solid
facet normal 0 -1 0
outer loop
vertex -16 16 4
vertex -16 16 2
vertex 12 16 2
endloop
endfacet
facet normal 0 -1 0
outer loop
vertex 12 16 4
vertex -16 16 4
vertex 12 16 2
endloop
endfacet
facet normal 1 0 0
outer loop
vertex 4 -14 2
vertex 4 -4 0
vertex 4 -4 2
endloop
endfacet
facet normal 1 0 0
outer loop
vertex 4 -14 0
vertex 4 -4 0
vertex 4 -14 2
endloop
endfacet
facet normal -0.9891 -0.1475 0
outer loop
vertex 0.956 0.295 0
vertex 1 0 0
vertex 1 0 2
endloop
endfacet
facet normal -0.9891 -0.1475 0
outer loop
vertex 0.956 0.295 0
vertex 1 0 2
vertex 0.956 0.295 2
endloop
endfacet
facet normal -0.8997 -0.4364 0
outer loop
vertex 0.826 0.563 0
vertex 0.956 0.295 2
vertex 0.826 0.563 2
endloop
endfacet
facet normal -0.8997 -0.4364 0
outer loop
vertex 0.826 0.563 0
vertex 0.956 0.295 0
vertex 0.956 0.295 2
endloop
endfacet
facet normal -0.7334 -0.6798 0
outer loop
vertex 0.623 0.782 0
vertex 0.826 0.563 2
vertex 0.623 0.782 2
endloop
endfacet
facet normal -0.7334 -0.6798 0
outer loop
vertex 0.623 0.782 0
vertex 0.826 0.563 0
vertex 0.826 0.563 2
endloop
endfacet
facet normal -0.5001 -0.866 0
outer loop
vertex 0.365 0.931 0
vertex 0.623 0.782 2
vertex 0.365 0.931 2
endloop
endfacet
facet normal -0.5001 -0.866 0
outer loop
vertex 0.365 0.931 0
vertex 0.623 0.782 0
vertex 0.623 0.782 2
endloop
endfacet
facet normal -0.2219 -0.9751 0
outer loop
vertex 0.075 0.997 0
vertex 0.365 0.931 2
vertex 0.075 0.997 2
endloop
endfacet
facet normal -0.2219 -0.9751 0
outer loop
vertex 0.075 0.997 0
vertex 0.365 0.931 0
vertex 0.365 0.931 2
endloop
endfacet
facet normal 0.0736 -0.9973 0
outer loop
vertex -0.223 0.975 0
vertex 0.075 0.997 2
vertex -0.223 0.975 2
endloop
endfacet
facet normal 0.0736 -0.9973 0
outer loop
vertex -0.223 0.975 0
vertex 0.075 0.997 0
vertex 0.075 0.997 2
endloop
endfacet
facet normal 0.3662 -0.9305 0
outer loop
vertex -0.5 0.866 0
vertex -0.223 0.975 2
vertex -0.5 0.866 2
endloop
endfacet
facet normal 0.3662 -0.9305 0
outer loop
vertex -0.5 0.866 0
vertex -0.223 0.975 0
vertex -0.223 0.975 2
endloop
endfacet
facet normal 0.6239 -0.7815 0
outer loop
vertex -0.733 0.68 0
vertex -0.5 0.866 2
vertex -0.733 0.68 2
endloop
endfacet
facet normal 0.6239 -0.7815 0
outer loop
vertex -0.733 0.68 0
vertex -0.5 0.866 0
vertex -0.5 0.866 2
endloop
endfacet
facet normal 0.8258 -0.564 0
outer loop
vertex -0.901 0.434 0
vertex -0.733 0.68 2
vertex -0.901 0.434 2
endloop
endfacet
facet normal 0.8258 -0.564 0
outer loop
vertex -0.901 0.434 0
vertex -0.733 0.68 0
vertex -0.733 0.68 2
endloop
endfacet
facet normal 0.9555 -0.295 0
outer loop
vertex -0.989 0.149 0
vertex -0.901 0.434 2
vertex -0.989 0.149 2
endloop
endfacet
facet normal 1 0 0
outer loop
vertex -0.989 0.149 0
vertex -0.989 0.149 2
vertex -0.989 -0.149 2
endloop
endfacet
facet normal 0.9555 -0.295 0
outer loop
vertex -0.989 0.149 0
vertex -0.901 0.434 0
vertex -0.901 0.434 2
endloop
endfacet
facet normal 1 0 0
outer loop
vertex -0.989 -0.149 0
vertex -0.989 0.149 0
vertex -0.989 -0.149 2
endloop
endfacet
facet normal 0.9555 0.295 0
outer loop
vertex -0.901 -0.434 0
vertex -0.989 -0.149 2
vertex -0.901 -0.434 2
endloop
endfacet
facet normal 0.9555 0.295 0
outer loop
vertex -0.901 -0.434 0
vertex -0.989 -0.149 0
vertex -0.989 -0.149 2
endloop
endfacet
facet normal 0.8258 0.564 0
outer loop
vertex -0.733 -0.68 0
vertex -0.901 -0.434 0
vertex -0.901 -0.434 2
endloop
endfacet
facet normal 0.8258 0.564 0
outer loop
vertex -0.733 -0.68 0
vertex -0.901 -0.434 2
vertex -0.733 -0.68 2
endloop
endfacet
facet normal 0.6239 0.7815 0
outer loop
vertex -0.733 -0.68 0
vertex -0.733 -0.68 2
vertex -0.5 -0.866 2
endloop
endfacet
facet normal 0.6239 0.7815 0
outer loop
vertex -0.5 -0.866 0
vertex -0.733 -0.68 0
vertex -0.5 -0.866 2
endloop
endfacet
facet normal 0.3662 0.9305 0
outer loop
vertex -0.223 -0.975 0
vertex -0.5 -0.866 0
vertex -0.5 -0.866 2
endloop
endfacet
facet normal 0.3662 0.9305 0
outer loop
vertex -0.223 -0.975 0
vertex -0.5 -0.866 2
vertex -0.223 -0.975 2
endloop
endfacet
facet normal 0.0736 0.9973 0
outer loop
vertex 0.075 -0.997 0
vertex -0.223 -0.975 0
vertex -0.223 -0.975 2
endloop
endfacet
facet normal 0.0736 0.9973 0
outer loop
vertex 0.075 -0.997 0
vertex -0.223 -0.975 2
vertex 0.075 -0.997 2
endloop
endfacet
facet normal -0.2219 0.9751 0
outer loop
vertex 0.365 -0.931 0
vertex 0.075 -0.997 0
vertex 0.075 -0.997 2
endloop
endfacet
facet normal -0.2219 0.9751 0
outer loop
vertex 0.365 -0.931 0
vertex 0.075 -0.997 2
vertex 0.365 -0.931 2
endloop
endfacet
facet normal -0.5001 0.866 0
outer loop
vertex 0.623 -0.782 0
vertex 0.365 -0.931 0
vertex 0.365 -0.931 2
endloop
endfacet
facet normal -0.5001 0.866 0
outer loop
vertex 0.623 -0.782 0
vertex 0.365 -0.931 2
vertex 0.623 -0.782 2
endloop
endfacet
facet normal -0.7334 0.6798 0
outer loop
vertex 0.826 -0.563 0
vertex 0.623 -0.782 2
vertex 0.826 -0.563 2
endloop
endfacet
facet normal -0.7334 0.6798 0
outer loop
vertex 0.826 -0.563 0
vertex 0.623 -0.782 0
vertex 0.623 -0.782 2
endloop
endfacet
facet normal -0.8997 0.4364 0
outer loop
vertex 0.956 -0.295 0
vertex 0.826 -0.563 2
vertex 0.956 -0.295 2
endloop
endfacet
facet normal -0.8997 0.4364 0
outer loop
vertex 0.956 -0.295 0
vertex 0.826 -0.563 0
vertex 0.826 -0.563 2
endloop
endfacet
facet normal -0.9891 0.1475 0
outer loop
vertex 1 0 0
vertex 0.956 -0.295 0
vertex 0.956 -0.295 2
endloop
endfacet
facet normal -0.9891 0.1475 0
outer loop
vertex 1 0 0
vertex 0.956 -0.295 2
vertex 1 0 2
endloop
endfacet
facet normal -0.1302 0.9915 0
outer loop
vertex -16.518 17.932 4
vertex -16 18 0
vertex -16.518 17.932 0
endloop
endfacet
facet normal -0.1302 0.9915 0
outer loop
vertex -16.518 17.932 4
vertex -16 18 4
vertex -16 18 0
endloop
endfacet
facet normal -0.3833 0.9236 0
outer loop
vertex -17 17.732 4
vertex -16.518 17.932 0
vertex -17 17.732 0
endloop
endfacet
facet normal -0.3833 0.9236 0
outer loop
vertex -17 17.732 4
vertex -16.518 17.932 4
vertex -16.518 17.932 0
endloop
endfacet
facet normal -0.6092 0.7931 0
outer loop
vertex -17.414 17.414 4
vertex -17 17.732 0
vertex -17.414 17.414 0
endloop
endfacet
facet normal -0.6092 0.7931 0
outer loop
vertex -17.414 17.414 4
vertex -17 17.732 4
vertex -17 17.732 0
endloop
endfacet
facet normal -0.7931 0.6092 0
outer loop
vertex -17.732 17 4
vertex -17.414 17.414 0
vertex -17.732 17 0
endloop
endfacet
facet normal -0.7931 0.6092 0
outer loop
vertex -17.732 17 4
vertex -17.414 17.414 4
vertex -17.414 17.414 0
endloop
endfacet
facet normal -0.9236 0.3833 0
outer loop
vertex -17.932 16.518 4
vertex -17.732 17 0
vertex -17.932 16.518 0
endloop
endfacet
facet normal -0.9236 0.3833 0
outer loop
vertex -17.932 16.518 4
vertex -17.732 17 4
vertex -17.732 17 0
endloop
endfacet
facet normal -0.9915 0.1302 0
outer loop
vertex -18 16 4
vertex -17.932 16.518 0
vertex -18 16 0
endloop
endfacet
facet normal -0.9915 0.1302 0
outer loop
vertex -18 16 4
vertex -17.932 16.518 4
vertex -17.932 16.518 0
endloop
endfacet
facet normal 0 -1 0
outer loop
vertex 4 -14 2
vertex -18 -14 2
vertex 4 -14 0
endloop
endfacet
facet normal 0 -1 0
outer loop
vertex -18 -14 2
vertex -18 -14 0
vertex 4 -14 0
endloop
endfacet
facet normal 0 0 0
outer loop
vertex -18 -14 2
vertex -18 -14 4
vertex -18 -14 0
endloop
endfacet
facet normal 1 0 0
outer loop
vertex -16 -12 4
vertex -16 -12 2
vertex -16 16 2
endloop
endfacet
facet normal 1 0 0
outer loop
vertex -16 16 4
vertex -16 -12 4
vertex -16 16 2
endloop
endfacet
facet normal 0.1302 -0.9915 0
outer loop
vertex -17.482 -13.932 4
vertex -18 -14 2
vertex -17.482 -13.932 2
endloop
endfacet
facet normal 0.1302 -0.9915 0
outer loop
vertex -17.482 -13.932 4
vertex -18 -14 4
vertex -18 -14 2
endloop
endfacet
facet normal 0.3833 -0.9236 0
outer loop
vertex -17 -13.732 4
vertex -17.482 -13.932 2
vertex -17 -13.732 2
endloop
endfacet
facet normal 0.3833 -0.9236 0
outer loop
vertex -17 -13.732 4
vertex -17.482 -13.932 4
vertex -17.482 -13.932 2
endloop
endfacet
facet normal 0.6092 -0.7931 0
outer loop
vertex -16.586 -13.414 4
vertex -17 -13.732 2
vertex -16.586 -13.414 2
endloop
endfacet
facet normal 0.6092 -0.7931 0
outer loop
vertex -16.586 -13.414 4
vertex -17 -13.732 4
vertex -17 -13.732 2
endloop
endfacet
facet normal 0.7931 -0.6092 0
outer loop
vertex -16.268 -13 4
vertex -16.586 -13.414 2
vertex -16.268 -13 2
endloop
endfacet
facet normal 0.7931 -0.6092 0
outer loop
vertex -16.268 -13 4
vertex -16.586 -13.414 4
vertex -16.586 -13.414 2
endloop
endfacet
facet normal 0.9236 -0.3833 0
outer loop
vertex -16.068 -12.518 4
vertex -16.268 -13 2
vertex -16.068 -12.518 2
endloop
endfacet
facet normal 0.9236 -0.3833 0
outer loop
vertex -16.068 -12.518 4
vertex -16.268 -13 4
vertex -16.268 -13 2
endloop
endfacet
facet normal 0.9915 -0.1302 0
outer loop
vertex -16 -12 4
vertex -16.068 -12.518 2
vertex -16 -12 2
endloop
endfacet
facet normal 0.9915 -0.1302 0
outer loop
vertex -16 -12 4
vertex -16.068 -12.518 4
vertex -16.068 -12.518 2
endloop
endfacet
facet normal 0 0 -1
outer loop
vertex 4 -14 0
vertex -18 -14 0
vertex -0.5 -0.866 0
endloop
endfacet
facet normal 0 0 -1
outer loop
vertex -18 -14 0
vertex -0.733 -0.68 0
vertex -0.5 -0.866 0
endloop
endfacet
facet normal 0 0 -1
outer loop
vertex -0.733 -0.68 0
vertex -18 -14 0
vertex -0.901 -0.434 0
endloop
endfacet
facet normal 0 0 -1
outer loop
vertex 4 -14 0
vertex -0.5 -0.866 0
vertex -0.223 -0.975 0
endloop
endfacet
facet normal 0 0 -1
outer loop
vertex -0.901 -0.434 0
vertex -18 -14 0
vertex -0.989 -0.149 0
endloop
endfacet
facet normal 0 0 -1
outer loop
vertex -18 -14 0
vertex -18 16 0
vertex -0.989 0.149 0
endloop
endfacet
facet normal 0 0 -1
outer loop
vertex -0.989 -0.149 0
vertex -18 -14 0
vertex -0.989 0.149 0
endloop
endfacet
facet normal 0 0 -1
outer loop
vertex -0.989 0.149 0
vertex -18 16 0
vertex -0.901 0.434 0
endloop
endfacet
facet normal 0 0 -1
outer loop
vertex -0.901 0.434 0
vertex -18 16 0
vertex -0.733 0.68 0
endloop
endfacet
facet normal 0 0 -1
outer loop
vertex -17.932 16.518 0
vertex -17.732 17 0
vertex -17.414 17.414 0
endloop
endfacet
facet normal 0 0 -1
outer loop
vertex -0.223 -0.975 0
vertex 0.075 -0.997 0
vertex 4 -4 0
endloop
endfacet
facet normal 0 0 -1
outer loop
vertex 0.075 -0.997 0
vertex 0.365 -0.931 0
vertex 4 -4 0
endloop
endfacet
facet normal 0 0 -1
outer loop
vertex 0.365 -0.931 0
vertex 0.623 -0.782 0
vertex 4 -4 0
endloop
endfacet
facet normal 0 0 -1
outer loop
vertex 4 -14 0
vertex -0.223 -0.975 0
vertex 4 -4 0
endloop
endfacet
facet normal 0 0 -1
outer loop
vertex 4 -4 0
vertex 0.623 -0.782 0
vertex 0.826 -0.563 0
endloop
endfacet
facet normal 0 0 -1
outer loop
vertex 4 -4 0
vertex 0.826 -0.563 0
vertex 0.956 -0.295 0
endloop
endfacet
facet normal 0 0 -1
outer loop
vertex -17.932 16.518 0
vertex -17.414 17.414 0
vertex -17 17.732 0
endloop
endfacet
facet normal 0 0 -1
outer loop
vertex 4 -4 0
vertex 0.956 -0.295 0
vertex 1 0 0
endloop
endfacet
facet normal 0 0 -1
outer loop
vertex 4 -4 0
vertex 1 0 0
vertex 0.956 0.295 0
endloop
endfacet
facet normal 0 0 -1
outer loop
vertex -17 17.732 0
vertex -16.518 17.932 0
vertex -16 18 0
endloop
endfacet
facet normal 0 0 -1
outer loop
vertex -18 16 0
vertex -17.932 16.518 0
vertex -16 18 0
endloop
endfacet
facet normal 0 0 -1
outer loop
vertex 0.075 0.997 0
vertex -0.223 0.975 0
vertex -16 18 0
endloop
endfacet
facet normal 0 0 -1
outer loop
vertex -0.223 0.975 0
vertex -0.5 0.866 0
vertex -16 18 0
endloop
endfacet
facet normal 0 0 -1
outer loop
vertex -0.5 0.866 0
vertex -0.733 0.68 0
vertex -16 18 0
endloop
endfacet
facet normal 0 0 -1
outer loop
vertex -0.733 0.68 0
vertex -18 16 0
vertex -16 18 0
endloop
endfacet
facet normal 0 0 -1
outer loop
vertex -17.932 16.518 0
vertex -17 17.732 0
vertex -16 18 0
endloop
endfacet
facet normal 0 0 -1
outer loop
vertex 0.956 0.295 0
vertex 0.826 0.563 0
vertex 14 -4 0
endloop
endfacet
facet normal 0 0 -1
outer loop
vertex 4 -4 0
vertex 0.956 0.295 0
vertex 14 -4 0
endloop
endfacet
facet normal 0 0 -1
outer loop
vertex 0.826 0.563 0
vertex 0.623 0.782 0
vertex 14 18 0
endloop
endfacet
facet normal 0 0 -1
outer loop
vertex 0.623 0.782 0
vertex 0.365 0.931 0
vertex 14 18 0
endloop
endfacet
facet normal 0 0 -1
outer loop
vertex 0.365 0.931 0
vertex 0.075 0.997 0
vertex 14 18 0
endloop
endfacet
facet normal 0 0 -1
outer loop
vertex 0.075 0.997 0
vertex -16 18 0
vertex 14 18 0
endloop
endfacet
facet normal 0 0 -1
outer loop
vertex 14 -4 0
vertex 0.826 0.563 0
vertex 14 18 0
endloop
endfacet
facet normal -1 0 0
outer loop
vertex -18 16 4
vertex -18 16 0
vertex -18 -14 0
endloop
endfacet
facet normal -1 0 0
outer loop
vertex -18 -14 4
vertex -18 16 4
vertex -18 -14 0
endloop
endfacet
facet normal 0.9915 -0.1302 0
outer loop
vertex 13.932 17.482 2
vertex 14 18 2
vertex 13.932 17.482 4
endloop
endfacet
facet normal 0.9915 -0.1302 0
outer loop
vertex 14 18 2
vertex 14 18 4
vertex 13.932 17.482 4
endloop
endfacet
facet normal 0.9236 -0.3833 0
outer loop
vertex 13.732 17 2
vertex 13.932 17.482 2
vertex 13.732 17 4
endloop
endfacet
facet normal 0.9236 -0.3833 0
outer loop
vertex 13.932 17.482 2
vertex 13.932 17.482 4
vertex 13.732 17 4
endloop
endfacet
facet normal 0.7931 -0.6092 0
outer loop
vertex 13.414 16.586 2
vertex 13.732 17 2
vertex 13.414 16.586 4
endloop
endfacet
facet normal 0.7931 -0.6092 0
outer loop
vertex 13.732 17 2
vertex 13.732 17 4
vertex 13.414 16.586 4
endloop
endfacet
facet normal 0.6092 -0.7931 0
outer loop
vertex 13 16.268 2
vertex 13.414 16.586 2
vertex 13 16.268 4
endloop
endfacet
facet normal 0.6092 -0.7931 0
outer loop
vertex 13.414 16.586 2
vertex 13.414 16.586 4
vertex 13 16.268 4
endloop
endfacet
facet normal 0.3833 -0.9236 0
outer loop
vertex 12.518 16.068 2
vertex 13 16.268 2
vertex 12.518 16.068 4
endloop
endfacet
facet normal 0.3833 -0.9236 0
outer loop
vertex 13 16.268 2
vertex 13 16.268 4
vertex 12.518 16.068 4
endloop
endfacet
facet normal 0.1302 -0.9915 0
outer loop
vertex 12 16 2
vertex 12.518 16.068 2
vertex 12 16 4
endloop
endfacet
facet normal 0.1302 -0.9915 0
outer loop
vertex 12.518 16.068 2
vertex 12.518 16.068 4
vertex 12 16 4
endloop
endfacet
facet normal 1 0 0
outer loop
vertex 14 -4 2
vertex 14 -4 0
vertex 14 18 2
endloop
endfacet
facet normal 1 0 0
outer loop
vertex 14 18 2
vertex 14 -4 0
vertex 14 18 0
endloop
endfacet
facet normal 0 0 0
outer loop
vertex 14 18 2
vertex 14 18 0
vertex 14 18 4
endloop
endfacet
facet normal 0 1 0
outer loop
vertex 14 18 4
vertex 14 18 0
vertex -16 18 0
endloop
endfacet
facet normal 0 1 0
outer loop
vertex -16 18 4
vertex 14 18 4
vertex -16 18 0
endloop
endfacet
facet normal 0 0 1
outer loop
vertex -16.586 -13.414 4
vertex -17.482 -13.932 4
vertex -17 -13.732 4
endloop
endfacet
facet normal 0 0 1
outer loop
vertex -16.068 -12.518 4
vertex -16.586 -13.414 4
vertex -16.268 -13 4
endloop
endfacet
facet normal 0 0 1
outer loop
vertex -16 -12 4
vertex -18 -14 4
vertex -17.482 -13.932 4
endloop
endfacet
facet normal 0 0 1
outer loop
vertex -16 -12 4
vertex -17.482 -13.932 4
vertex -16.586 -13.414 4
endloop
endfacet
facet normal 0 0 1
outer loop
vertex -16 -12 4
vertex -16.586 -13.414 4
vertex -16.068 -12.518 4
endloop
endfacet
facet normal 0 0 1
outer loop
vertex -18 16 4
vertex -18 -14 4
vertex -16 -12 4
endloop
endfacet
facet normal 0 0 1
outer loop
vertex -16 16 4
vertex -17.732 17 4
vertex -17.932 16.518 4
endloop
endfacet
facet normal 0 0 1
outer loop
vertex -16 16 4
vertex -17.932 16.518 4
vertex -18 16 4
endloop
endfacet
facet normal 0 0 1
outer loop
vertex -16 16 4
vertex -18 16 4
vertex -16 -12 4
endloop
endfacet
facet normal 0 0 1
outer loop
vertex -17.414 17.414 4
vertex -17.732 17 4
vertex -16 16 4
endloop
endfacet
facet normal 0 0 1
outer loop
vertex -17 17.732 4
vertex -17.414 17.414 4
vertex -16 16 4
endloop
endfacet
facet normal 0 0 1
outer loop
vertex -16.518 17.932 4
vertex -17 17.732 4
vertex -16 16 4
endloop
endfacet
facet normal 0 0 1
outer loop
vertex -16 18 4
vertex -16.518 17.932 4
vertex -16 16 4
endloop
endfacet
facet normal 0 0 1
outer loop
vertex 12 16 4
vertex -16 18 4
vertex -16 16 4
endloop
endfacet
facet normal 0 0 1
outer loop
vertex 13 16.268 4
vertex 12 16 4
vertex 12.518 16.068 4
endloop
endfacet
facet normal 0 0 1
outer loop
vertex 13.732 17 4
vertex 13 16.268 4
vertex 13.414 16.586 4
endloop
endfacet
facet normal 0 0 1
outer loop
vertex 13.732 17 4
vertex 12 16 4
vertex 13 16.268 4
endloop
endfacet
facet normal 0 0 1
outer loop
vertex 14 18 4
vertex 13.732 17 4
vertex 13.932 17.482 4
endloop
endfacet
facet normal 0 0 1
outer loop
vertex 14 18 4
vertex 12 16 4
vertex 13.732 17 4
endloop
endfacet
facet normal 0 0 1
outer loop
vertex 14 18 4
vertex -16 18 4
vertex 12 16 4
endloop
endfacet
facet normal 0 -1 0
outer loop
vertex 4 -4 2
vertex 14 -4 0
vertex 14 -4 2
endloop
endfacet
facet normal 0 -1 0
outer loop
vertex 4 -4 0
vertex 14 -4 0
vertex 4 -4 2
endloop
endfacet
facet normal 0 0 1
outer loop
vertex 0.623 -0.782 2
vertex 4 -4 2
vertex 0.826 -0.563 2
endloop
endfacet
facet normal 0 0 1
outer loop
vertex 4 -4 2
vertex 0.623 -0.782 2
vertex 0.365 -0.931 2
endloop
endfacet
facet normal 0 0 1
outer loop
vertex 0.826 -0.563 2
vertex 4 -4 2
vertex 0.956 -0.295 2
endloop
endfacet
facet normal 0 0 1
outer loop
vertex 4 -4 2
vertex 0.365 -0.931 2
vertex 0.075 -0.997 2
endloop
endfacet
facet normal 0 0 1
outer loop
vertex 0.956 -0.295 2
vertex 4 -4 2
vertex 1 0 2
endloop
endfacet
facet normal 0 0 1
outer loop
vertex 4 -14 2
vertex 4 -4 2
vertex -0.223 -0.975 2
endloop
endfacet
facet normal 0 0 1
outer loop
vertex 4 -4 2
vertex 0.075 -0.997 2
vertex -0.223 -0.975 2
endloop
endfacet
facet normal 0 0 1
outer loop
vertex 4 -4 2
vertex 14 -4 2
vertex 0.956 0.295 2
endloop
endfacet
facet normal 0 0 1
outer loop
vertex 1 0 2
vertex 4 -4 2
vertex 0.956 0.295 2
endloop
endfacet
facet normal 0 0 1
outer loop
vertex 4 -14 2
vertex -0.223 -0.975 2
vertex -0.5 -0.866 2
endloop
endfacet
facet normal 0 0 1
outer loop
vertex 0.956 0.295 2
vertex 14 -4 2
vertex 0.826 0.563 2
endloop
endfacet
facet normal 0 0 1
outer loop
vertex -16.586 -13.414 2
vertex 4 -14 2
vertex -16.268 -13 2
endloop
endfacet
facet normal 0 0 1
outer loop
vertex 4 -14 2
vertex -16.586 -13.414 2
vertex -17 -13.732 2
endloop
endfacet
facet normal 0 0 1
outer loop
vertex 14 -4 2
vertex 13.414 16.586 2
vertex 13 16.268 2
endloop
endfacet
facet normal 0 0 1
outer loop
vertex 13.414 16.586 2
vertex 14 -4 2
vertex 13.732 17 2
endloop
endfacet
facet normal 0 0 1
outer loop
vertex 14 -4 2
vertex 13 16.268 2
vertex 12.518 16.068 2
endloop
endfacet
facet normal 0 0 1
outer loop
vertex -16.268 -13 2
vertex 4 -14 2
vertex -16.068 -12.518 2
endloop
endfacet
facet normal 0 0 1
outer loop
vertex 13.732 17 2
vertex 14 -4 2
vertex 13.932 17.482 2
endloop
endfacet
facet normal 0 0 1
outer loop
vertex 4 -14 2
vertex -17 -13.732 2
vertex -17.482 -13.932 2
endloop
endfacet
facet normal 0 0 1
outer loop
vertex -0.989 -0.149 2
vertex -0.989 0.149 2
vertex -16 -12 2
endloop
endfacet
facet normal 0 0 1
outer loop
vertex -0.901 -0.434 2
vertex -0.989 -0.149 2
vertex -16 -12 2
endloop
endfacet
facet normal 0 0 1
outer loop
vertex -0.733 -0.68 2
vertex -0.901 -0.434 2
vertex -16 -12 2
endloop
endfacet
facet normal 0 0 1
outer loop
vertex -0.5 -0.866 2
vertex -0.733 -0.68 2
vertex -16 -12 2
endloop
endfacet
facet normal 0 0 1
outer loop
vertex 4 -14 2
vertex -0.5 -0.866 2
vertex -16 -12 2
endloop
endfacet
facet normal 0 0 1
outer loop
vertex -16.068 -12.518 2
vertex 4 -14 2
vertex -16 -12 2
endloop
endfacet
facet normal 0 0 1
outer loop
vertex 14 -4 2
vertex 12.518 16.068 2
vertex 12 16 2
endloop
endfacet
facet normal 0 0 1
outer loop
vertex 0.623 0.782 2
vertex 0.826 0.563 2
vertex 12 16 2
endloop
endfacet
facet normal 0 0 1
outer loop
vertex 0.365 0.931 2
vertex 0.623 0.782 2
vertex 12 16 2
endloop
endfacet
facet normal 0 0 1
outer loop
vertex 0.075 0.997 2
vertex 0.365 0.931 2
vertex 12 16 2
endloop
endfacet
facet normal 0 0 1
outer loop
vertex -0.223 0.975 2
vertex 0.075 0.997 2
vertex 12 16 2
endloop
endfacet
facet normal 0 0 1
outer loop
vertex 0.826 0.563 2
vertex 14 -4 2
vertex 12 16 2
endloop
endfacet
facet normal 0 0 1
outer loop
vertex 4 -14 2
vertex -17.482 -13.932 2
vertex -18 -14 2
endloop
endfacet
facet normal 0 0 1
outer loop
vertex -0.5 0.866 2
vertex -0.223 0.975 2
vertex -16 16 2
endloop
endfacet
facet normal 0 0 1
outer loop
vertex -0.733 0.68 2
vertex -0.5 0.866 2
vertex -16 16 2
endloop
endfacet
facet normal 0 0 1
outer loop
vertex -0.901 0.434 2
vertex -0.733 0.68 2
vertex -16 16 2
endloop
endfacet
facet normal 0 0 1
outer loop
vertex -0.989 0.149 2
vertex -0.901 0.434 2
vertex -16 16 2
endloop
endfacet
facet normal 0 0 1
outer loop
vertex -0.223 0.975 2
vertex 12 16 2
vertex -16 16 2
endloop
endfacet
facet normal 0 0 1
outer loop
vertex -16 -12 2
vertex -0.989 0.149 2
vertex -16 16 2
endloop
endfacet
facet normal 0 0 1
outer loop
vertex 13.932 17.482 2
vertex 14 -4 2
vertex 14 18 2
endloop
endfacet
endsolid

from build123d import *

# Parameters (mm, degrees)
SKETCH1_R                = 1
BOSS_EXTRUDE1_DEPTH      = 2
BOSS_EXTRUDE2_DEPTH      = 2
BOSS_EXTRUDE2_DEPTH_BACK = 2
FILLET1_R                = 2


with BuildPart() as part:
    # Sketch1 → Boss-Extrude1 (new body)
    with BuildSketch(Plane.XY):
        Polygon((-16, -14), (-16, 16), (14, 16), (14, -4), (4, -4), (4, -14), align=None)
        Circle(SKETCH1_R, mode=Mode.SUBTRACT)
    extrude(amount=BOSS_EXTRUDE1_DEPTH)

    # Sketch3 → Boss-Extrude2 (add, two sides: drawn at the far end of the back side and taken through both)
    with BuildSketch(Plane.XY.offset(2).offset(-BOSS_EXTRUDE2_DEPTH_BACK)):
        Polygon((-18, -14), (-16, -14), (-16, 16), (14, 16), (14, 18), (-18, 18), align=None)
    extrude(amount=BOSS_EXTRUDE2_DEPTH + BOSS_EXTRUDE2_DEPTH_BACK)

    # Fillet1
    fillet1_edges = [part.edges().sort_by_distance(p)[0] for p in [
        (14, 16, 3),
        (-16, -14, 3),
        (-18, 18, 2),
    ]]
    fillet(fillet1_edges, radius=FILLET1_R - 0.0001)  # a hair under: the kernel refuses the full size


solid = part.part
